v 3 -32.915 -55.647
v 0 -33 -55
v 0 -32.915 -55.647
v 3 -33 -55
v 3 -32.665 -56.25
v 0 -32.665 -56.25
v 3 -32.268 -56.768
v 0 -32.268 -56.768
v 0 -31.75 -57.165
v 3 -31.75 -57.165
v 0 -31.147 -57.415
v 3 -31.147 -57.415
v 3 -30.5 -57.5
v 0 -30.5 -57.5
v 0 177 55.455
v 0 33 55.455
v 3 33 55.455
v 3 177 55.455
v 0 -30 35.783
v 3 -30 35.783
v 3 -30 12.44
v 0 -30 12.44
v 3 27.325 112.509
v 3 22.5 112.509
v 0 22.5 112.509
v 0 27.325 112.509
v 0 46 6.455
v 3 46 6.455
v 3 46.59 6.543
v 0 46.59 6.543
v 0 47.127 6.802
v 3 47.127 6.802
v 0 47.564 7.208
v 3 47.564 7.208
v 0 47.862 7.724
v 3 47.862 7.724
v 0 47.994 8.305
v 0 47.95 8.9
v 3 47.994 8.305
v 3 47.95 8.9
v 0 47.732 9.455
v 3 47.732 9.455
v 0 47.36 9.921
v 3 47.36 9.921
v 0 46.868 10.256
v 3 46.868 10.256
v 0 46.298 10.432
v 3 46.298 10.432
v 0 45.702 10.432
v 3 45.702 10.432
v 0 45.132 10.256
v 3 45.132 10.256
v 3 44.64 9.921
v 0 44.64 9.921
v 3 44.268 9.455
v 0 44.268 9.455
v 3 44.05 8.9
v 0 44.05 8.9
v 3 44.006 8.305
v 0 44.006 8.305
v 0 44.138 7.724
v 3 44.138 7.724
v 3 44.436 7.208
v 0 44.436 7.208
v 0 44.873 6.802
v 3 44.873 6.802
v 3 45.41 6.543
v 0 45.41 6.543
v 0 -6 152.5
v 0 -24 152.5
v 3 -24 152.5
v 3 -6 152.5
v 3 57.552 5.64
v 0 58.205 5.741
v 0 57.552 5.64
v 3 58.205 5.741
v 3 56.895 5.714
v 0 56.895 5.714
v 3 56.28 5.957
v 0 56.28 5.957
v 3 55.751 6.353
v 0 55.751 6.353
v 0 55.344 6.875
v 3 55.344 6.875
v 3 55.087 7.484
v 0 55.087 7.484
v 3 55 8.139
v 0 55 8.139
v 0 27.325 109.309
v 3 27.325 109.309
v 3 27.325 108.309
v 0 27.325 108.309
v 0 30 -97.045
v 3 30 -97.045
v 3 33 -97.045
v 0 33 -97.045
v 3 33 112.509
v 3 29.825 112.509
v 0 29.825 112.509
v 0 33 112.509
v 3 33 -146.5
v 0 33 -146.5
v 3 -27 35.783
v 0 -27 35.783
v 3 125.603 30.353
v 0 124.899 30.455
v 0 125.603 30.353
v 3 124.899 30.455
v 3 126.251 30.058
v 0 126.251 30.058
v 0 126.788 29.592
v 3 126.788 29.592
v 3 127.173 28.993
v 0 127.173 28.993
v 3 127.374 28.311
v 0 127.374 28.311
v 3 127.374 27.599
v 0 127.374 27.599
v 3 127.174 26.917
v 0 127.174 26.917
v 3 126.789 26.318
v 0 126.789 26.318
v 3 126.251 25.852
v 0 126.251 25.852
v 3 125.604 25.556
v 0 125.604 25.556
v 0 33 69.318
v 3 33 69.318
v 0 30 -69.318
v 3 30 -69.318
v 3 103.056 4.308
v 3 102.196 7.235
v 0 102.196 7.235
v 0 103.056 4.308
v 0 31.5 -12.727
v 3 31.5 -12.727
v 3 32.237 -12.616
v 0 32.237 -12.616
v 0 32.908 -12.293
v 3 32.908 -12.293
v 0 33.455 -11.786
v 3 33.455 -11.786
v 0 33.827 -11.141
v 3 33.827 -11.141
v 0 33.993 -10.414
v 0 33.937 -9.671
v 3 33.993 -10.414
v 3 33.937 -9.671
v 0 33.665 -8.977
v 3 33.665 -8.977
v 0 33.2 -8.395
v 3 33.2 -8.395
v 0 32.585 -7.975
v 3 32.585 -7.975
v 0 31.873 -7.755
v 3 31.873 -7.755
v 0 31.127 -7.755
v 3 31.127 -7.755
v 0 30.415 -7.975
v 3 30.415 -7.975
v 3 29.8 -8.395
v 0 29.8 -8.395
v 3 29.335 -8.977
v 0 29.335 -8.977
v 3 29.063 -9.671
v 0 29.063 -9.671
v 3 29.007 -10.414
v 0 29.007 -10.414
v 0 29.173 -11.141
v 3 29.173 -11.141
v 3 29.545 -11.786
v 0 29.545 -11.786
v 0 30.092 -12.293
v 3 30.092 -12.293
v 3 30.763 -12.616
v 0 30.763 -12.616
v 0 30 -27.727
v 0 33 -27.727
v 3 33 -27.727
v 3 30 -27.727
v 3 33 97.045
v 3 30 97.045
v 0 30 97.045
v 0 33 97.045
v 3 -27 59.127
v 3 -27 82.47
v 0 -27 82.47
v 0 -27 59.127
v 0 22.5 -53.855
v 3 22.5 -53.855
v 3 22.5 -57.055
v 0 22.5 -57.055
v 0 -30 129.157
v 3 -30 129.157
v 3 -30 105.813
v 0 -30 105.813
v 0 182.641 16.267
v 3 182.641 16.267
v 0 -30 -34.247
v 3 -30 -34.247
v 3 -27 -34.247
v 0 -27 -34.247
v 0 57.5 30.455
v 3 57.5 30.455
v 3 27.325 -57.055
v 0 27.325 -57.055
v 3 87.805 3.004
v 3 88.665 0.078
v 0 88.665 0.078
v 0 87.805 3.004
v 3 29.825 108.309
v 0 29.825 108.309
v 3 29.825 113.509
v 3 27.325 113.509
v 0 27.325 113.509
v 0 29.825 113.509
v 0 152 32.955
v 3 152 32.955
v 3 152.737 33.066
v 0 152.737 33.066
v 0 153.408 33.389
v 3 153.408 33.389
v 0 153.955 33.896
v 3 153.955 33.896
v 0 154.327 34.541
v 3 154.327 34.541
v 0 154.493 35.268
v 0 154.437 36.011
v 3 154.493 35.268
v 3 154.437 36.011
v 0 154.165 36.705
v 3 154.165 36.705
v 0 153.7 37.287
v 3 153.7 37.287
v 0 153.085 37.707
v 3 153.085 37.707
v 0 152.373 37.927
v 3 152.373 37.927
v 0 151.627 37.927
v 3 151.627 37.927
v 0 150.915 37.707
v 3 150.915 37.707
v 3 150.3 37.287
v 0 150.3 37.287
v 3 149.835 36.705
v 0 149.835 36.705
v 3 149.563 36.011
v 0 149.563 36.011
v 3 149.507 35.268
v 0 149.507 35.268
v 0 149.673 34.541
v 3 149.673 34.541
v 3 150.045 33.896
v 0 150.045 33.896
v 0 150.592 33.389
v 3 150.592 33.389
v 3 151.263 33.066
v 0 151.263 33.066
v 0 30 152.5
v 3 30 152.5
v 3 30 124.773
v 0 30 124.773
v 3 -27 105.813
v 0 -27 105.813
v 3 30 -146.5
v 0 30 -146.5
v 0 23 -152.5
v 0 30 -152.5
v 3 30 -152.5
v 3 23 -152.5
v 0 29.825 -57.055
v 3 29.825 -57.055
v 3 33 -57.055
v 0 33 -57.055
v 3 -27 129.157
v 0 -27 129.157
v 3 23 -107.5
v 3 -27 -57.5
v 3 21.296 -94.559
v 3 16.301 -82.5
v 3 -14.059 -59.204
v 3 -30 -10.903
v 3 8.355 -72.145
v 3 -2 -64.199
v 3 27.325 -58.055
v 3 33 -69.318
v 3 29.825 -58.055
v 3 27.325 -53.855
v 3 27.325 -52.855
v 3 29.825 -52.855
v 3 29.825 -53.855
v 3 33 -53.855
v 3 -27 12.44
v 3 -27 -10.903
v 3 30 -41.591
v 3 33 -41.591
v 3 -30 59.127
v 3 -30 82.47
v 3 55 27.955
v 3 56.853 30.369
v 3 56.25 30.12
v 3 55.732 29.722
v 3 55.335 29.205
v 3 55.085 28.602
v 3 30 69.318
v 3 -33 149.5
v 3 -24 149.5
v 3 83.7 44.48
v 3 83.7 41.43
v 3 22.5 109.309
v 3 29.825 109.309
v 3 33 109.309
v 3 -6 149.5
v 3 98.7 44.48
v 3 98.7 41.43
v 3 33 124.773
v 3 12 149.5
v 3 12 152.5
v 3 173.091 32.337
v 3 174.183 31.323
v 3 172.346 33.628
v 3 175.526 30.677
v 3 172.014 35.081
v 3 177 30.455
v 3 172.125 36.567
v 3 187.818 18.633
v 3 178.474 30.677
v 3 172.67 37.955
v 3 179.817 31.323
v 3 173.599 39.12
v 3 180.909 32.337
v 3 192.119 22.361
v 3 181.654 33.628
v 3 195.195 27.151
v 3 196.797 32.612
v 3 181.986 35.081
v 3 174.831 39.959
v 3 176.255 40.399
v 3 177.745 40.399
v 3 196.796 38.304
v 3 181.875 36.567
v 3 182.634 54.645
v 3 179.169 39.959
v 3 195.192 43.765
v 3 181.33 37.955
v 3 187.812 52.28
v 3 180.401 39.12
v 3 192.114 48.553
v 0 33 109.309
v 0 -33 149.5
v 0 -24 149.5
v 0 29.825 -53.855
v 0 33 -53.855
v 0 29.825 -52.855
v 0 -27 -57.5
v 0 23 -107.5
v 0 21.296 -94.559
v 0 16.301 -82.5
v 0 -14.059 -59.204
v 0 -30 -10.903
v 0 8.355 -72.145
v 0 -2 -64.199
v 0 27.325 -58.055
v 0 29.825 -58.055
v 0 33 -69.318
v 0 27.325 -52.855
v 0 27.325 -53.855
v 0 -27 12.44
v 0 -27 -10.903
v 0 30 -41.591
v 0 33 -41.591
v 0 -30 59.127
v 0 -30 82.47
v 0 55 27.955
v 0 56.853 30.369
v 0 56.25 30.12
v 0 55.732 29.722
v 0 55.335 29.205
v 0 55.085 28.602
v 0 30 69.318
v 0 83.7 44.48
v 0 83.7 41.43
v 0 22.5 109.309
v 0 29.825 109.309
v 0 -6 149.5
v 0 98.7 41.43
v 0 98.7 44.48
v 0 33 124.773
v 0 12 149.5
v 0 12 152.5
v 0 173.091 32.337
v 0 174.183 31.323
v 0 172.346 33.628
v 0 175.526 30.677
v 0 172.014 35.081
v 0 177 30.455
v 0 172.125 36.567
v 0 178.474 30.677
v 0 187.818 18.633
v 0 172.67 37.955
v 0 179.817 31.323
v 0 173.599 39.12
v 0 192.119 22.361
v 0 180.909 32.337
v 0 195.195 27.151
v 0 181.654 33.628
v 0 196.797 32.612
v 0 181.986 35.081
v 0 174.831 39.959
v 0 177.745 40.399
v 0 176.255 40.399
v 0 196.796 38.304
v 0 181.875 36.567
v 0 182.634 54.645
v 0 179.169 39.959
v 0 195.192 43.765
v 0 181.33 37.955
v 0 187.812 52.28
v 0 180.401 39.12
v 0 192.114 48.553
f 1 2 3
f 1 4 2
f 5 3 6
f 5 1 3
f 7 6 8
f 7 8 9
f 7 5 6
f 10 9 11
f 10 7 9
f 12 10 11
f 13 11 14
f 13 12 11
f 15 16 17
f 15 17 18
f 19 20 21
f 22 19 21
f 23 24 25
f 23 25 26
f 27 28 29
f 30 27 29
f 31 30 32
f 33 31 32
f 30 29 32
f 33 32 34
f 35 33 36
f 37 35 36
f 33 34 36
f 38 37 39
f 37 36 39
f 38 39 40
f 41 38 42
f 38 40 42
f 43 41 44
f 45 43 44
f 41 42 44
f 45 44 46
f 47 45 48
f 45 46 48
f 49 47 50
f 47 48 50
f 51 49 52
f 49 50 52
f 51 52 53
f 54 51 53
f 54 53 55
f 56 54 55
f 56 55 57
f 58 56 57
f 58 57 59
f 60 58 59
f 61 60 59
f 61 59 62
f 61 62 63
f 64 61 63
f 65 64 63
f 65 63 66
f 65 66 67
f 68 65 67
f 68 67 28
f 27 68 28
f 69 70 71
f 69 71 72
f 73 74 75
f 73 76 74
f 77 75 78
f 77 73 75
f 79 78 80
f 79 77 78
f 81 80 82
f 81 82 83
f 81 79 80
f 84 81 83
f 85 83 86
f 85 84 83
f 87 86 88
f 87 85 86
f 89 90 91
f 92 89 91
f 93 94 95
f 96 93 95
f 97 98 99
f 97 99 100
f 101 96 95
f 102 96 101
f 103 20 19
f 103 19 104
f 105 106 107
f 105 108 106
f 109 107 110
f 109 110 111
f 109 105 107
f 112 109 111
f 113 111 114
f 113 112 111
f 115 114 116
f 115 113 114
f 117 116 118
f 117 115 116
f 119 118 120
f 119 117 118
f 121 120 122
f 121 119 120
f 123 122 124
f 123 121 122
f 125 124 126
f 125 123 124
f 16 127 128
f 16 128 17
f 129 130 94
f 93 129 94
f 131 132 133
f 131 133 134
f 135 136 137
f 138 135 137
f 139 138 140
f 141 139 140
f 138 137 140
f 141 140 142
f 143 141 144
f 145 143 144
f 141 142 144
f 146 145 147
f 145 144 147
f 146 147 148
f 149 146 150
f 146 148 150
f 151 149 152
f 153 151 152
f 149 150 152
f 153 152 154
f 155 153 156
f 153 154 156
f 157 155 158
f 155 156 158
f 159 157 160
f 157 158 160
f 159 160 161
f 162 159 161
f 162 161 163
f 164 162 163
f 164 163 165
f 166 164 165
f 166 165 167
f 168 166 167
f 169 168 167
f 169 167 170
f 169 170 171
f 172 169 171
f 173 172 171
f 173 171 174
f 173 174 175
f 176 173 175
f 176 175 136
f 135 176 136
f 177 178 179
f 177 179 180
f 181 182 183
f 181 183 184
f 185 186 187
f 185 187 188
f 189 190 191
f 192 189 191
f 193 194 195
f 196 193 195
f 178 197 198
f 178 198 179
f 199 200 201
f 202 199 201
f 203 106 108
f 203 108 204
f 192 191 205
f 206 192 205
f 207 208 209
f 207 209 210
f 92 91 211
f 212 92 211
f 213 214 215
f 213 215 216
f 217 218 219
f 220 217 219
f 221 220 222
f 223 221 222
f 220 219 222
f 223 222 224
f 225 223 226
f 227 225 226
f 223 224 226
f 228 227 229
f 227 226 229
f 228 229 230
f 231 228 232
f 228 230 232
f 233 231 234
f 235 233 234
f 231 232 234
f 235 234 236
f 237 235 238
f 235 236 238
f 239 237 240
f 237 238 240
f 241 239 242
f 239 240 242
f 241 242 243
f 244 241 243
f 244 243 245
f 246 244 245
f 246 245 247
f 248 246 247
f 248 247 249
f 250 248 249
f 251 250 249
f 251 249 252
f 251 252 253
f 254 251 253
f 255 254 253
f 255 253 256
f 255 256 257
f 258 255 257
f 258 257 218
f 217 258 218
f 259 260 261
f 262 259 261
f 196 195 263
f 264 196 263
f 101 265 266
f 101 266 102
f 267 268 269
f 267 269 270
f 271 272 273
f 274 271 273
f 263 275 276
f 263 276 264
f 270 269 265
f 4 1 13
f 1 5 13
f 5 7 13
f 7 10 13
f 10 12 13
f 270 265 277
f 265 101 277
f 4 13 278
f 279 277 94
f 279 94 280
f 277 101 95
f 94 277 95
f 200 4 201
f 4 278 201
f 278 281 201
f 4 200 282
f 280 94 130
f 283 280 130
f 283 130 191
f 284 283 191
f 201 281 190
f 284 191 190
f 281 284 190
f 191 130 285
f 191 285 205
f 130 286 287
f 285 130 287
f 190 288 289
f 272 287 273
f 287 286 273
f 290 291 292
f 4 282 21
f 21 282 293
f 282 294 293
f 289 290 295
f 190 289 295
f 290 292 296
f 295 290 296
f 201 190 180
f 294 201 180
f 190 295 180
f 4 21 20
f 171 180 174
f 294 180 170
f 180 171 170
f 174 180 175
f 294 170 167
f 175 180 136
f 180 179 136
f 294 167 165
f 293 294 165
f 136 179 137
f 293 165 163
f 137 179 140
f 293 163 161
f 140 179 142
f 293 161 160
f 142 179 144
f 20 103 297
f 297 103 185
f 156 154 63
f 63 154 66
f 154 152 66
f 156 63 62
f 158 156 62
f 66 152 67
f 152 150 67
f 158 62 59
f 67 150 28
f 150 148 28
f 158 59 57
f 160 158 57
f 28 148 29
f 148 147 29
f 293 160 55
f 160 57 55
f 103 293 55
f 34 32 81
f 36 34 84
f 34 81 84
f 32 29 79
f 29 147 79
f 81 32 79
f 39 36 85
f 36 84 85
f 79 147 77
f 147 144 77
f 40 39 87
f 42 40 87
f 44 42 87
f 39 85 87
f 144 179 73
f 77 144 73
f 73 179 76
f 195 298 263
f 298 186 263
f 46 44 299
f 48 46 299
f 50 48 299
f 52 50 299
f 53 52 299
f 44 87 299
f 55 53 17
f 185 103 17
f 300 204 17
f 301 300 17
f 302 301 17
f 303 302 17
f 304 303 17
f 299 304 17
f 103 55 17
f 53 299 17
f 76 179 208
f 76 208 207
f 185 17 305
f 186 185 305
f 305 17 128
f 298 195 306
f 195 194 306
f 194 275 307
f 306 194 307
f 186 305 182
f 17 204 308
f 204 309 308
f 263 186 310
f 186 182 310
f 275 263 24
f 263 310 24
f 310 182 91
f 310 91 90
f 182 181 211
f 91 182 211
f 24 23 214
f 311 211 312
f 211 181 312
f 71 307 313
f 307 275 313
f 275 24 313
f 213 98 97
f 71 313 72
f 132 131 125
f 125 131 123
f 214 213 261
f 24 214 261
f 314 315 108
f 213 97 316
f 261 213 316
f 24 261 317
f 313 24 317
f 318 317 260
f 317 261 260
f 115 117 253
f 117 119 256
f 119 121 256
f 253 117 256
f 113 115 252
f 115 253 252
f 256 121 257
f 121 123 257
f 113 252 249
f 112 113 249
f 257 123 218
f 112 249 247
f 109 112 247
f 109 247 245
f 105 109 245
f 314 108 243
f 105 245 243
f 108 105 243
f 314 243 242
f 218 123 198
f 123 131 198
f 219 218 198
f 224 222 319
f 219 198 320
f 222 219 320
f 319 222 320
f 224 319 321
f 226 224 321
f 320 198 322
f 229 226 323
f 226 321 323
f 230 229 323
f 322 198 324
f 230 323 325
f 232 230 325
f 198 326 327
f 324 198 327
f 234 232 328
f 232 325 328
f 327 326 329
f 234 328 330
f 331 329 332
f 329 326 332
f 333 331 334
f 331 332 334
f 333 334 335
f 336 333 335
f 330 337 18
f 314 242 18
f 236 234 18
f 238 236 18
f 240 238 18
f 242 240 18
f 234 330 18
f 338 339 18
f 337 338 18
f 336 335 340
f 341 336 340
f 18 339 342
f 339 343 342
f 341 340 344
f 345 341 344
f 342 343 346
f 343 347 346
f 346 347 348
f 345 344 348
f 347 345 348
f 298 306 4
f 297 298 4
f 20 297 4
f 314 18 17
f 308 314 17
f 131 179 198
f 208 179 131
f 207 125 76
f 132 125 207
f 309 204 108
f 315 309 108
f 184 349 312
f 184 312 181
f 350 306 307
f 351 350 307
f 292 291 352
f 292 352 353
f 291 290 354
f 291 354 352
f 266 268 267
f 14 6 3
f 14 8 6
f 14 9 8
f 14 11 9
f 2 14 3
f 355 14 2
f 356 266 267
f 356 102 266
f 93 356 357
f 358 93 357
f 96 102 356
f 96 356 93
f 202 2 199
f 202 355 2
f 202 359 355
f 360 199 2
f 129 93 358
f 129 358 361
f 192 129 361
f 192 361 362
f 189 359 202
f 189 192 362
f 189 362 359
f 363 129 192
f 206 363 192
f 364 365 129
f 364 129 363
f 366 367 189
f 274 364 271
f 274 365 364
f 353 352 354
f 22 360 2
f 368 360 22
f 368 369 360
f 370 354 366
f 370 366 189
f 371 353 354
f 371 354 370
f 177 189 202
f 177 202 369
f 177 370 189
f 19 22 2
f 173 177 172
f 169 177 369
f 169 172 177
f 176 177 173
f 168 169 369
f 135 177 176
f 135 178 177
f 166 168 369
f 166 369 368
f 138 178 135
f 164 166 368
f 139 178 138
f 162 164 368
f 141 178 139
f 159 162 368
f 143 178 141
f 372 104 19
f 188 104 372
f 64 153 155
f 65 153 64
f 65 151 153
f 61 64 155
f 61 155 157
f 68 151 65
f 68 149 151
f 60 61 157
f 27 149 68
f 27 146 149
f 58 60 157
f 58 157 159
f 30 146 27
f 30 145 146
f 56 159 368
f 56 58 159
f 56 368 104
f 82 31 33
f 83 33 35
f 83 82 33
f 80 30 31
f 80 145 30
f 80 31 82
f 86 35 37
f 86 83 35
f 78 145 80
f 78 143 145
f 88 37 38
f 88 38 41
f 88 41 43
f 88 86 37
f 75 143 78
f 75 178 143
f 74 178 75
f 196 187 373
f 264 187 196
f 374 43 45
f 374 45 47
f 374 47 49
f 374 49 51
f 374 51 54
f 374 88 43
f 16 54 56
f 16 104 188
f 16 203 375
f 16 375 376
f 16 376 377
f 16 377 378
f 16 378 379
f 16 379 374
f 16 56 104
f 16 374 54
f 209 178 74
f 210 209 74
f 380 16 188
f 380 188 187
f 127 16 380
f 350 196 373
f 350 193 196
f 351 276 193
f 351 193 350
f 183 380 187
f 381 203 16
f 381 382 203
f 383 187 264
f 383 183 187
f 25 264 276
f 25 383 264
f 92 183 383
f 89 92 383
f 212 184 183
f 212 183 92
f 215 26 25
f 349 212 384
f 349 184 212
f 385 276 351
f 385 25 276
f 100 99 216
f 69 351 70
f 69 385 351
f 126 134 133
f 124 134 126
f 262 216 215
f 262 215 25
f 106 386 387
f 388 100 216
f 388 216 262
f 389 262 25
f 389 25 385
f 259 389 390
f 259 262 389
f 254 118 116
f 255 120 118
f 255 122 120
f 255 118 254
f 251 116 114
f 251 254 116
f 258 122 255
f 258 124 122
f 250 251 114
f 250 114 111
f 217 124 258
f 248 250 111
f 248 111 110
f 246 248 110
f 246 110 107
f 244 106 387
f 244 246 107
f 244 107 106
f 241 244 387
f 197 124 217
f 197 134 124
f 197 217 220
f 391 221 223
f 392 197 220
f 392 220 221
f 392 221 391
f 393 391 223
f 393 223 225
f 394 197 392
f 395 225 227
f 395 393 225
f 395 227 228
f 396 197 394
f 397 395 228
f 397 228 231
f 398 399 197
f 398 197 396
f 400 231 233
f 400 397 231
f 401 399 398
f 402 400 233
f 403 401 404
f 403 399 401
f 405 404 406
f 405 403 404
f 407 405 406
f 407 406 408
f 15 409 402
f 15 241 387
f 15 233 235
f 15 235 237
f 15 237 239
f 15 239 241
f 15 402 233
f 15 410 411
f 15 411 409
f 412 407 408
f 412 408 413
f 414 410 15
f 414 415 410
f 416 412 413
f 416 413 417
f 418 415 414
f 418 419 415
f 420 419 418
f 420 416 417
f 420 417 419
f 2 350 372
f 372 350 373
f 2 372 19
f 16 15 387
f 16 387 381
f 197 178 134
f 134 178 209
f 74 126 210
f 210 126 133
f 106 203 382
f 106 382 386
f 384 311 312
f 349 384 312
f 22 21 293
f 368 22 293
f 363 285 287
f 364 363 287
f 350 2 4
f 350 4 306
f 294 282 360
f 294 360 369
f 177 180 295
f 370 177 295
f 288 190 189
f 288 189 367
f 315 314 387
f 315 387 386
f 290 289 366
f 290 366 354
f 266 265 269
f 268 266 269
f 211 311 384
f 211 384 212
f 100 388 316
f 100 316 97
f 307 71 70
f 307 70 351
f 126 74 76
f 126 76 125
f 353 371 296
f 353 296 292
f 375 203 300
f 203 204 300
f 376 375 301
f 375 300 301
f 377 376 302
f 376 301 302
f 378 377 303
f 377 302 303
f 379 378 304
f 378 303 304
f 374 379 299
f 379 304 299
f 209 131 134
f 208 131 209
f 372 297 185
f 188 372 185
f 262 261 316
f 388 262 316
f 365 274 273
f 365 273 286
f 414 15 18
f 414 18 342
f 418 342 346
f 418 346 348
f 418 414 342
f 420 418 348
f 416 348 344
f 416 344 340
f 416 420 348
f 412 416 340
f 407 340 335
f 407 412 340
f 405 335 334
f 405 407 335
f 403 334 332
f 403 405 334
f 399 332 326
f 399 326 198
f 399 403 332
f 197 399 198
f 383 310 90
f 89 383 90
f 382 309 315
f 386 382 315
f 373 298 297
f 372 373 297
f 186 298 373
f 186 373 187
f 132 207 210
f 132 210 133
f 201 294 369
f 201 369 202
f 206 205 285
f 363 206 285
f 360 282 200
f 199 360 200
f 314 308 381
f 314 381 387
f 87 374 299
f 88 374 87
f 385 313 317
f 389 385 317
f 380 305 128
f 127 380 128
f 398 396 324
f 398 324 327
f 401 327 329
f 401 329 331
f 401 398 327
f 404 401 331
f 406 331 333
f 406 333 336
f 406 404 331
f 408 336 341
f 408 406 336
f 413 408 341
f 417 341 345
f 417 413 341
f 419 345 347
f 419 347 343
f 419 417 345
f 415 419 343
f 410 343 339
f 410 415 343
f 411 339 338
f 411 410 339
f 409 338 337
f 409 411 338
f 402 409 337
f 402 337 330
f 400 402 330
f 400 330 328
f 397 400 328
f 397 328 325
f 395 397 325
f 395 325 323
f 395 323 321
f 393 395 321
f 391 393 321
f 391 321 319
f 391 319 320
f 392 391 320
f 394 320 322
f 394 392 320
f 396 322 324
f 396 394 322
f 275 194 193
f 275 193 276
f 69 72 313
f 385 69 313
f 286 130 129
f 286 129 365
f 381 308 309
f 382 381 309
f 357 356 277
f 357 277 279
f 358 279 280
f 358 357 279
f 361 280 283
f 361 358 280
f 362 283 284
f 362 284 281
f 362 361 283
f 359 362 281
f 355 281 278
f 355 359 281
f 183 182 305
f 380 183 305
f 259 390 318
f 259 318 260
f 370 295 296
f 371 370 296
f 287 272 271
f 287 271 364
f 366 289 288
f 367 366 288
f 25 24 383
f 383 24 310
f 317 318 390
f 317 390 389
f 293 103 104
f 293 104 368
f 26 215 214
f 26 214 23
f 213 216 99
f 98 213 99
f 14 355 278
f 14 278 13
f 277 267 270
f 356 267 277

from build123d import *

# Parameters (mm, degrees)
BOSS_EXTRUDE1_DEPTH     = 3
SKETCH2_W               = 27.727272727
SKETCH2_H               = 3
SKETCH2_W_2             = 3
SKETCH2_H_2             = 18
SKETCH2_H_3             = 9
SKETCH2_W_3             = 23.343342349
SKETCH2_W_4             = 23.34334235
SKETCH2_W_5             = 6
CUT_EXTRUDE1_DEPTH      = 1
CUT_EXTRUDE1_DEPTH_BACK = 4
SKETCH3_W               = 3.2
SKETCH3_H               = 10.5
SKETCH3_W_2             = 5.2
SKETCH3_H_2             = 2.5
CUT_EXTRUDE2_DEPTH      = 1
CUT_EXTRUDE2_DEPTH_BACK = 4
FILLET1_R               = 2.5
SKETCH4_R               = 5
BOSS_EXTRUDE2_DEPTH     = 3
FILLET2_R               = 2.5
SKETCH5_R               = 2.5
SKETCH5_R_2             = 2
SKETCH5_W               = 3.05
SKETCH5_H               = 15
CUT_EXTRUDE3_DEPTH      = 1
CUT_EXTRUDE3_DEPTH_BACK = 4


with BuildPart() as part:
    # Sketch1 → Boss-Extrude1 (new body)
    with BuildSketch(Plane(origin=(0, 0, 0), x_dir=(0, 0, -1), z_dir=(1, 0, 0))):
        with BuildLine():
            Line((-152.5, 33), (152.5, 33))
            Line((152.5, 33), (152.5, 23))
            Line((152.5, 23), (107.5, 23))
            ThreePointArc((107.5, 23), (72.144660941, 8.355339059), (57.5, -27))
            Line((57.5, -27), (57.5, -33))
            Line((57.5, -33), (-152.5, -33))
            Line((-152.5, -33), (-152.5, 33))
        make_face()
    extrude(amount=BOSS_EXTRUDE1_DEPTH)

    # Sketch2 → Cut-Extrude1 (cut, two sides)
    with BuildSketch(Plane(origin=(3, 0, 0), x_dir=(0, 0, -1), z_dir=(1, 0, 0))) as cut_extrude1_sk:
        with Locations((27.727272728, 31.5)):
            Rectangle(SKETCH2_W, SKETCH2_H)
        with Locations((83.181818182, 31.5)):
            Rectangle(SKETCH2_W, SKETCH2_H)
        with Locations((-138.636363636, 31.5)):
            Rectangle(SKETCH2_W, SKETCH2_H)
        with Locations((-83.181818182, 31.5)):
            Rectangle(SKETCH2_W, SKETCH2_H)
        with Locations((-27.727272728, 31.5)):
            Rectangle(SKETCH2_W, SKETCH2_H)
        with Locations((-151, 3)):
            Rectangle(SKETCH2_W_2, SKETCH2_H_2)
        with Locations((-151, -28.5)):
            Rectangle(SKETCH2_W_2, SKETCH2_H_3)
        with Locations((-117.484986475, -28.5)):
            Rectangle(SKETCH2_W_3, SKETCH2_H)
        with Locations((-70.798301777, -28.5)):
            Rectangle(SKETCH2_W_3, SKETCH2_H)
        with Locations((22.575067622, -28.5)):
            Rectangle(SKETCH2_W_4, SKETCH2_H)
        with Locations((149.5, 31.5)):
            Rectangle(SKETCH2_W_5, SKETCH2_H)
        with Locations((-24.111617078, -28.5)):
            Rectangle(SKETCH2_W_3, SKETCH2_H)
    extrude(amount=CUT_EXTRUDE1_DEPTH, mode=Mode.SUBTRACT)
    extrude(cut_extrude1_sk.sketch, amount=-CUT_EXTRUDE1_DEPTH_BACK, mode=Mode.SUBTRACT)

    # Sketch3 → Cut-Extrude2 (cut, two sides)
    with BuildSketch(Plane(origin=(3, 0, 0), x_dir=(0, 0, -1), z_dir=(1, 0, 0))) as cut_extrude2_sk:
        with Locations((-110.909090909, 27.75)):
            Rectangle(SKETCH3_W, SKETCH3_H)
        with Locations((55.454545455, 27.75)):
            Rectangle(SKETCH3_W, SKETCH3_H)
        with Locations((55.454545455, 28.575)):
            Rectangle(SKETCH3_W_2, SKETCH3_H_2)
        with Locations((-110.909090909, 28.575)):
            Rectangle(SKETCH3_W_2, SKETCH3_H_2)
    extrude(amount=CUT_EXTRUDE2_DEPTH, mode=Mode.SUBTRACT)
    extrude(cut_extrude2_sk.sketch, amount=-CUT_EXTRUDE2_DEPTH_BACK, mode=Mode.SUBTRACT)

    # Fillet1
    fillet1_edges = [part.edges().sort_by_distance(p)[0] for p in [
        (1.5, -33, -57.5),
    ]]
    fillet(fillet1_edges, radius=FILLET1_R)

    # Sketch4 → Boss-Extrude2 (add)
    with BuildSketch(Plane(origin=(0, 0, 0), x_dir=(0, 0, -1), z_dir=(1, 0, 0))):
        with BuildLine():
            Line((-55.454545455, 30), (-55.454545455, 177))
            ThreePointArc((-55.454545455, 177), (-38.304207087, 196.795944751), (-16.266602596, 182.641174423))
            Line((-16.266602596, 182.641174423), (27.727272727, 33))
            Line((27.727272727, 33), (27.727272727, 30))
            Line((27.727272727, 30), (-55.454545455, 30))
        make_face()
        with Locations((-35.454545455, 177)):
            Circle(SKETCH4_R, mode=Mode.SUBTRACT)
        Polygon((-30.454545455, 55), (-4.798665146, 55), (-30.454545455, 142.266148573), align=None, mode=Mode.SUBTRACT)
    extrude(amount=BOSS_EXTRUDE2_DEPTH)

    # Fillet2
    fillet2_edges = [part.edges().sort_by_distance(p)[0] for p in [
        (1.5, 55, 30.454545455),
        (1.5, 55, 4.798665146),
        (1.5, 142.266148573, 30.454545455),
    ]]
    fillet(fillet2_edges, radius=FILLET2_R)

    # Sketch5 → Cut-Extrude3 (cut, two sides)
    with BuildSketch(Plane(origin=(3, 0, 0), x_dir=(0, 0, -1), z_dir=(1, 0, 0))) as cut_extrude3_sk:
        with Locations((10.227172727, 31.5)):
            Circle(SKETCH5_R)
        with Locations((-35.454545455, 152)):
            Circle(SKETCH5_R)
        with Locations((-8.454545455, 46)):
            Circle(SKETCH5_R_2)
        Polygon((-3.003684653, 87.804874126), (-7.23456547, 102.195831269), (-4.308404184, 103.056110369), (-0.077523367, 88.665153225), align=None)
        with Locations((-42.954545455, 91.19961143)):
            Rectangle(SKETCH5_W, SKETCH5_H)
    extrude(amount=CUT_EXTRUDE3_DEPTH, mode=Mode.SUBTRACT)
    extrude(cut_extrude3_sk.sketch, amount=-CUT_EXTRUDE3_DEPTH_BACK, mode=Mode.SUBTRACT)


solid = part.part
